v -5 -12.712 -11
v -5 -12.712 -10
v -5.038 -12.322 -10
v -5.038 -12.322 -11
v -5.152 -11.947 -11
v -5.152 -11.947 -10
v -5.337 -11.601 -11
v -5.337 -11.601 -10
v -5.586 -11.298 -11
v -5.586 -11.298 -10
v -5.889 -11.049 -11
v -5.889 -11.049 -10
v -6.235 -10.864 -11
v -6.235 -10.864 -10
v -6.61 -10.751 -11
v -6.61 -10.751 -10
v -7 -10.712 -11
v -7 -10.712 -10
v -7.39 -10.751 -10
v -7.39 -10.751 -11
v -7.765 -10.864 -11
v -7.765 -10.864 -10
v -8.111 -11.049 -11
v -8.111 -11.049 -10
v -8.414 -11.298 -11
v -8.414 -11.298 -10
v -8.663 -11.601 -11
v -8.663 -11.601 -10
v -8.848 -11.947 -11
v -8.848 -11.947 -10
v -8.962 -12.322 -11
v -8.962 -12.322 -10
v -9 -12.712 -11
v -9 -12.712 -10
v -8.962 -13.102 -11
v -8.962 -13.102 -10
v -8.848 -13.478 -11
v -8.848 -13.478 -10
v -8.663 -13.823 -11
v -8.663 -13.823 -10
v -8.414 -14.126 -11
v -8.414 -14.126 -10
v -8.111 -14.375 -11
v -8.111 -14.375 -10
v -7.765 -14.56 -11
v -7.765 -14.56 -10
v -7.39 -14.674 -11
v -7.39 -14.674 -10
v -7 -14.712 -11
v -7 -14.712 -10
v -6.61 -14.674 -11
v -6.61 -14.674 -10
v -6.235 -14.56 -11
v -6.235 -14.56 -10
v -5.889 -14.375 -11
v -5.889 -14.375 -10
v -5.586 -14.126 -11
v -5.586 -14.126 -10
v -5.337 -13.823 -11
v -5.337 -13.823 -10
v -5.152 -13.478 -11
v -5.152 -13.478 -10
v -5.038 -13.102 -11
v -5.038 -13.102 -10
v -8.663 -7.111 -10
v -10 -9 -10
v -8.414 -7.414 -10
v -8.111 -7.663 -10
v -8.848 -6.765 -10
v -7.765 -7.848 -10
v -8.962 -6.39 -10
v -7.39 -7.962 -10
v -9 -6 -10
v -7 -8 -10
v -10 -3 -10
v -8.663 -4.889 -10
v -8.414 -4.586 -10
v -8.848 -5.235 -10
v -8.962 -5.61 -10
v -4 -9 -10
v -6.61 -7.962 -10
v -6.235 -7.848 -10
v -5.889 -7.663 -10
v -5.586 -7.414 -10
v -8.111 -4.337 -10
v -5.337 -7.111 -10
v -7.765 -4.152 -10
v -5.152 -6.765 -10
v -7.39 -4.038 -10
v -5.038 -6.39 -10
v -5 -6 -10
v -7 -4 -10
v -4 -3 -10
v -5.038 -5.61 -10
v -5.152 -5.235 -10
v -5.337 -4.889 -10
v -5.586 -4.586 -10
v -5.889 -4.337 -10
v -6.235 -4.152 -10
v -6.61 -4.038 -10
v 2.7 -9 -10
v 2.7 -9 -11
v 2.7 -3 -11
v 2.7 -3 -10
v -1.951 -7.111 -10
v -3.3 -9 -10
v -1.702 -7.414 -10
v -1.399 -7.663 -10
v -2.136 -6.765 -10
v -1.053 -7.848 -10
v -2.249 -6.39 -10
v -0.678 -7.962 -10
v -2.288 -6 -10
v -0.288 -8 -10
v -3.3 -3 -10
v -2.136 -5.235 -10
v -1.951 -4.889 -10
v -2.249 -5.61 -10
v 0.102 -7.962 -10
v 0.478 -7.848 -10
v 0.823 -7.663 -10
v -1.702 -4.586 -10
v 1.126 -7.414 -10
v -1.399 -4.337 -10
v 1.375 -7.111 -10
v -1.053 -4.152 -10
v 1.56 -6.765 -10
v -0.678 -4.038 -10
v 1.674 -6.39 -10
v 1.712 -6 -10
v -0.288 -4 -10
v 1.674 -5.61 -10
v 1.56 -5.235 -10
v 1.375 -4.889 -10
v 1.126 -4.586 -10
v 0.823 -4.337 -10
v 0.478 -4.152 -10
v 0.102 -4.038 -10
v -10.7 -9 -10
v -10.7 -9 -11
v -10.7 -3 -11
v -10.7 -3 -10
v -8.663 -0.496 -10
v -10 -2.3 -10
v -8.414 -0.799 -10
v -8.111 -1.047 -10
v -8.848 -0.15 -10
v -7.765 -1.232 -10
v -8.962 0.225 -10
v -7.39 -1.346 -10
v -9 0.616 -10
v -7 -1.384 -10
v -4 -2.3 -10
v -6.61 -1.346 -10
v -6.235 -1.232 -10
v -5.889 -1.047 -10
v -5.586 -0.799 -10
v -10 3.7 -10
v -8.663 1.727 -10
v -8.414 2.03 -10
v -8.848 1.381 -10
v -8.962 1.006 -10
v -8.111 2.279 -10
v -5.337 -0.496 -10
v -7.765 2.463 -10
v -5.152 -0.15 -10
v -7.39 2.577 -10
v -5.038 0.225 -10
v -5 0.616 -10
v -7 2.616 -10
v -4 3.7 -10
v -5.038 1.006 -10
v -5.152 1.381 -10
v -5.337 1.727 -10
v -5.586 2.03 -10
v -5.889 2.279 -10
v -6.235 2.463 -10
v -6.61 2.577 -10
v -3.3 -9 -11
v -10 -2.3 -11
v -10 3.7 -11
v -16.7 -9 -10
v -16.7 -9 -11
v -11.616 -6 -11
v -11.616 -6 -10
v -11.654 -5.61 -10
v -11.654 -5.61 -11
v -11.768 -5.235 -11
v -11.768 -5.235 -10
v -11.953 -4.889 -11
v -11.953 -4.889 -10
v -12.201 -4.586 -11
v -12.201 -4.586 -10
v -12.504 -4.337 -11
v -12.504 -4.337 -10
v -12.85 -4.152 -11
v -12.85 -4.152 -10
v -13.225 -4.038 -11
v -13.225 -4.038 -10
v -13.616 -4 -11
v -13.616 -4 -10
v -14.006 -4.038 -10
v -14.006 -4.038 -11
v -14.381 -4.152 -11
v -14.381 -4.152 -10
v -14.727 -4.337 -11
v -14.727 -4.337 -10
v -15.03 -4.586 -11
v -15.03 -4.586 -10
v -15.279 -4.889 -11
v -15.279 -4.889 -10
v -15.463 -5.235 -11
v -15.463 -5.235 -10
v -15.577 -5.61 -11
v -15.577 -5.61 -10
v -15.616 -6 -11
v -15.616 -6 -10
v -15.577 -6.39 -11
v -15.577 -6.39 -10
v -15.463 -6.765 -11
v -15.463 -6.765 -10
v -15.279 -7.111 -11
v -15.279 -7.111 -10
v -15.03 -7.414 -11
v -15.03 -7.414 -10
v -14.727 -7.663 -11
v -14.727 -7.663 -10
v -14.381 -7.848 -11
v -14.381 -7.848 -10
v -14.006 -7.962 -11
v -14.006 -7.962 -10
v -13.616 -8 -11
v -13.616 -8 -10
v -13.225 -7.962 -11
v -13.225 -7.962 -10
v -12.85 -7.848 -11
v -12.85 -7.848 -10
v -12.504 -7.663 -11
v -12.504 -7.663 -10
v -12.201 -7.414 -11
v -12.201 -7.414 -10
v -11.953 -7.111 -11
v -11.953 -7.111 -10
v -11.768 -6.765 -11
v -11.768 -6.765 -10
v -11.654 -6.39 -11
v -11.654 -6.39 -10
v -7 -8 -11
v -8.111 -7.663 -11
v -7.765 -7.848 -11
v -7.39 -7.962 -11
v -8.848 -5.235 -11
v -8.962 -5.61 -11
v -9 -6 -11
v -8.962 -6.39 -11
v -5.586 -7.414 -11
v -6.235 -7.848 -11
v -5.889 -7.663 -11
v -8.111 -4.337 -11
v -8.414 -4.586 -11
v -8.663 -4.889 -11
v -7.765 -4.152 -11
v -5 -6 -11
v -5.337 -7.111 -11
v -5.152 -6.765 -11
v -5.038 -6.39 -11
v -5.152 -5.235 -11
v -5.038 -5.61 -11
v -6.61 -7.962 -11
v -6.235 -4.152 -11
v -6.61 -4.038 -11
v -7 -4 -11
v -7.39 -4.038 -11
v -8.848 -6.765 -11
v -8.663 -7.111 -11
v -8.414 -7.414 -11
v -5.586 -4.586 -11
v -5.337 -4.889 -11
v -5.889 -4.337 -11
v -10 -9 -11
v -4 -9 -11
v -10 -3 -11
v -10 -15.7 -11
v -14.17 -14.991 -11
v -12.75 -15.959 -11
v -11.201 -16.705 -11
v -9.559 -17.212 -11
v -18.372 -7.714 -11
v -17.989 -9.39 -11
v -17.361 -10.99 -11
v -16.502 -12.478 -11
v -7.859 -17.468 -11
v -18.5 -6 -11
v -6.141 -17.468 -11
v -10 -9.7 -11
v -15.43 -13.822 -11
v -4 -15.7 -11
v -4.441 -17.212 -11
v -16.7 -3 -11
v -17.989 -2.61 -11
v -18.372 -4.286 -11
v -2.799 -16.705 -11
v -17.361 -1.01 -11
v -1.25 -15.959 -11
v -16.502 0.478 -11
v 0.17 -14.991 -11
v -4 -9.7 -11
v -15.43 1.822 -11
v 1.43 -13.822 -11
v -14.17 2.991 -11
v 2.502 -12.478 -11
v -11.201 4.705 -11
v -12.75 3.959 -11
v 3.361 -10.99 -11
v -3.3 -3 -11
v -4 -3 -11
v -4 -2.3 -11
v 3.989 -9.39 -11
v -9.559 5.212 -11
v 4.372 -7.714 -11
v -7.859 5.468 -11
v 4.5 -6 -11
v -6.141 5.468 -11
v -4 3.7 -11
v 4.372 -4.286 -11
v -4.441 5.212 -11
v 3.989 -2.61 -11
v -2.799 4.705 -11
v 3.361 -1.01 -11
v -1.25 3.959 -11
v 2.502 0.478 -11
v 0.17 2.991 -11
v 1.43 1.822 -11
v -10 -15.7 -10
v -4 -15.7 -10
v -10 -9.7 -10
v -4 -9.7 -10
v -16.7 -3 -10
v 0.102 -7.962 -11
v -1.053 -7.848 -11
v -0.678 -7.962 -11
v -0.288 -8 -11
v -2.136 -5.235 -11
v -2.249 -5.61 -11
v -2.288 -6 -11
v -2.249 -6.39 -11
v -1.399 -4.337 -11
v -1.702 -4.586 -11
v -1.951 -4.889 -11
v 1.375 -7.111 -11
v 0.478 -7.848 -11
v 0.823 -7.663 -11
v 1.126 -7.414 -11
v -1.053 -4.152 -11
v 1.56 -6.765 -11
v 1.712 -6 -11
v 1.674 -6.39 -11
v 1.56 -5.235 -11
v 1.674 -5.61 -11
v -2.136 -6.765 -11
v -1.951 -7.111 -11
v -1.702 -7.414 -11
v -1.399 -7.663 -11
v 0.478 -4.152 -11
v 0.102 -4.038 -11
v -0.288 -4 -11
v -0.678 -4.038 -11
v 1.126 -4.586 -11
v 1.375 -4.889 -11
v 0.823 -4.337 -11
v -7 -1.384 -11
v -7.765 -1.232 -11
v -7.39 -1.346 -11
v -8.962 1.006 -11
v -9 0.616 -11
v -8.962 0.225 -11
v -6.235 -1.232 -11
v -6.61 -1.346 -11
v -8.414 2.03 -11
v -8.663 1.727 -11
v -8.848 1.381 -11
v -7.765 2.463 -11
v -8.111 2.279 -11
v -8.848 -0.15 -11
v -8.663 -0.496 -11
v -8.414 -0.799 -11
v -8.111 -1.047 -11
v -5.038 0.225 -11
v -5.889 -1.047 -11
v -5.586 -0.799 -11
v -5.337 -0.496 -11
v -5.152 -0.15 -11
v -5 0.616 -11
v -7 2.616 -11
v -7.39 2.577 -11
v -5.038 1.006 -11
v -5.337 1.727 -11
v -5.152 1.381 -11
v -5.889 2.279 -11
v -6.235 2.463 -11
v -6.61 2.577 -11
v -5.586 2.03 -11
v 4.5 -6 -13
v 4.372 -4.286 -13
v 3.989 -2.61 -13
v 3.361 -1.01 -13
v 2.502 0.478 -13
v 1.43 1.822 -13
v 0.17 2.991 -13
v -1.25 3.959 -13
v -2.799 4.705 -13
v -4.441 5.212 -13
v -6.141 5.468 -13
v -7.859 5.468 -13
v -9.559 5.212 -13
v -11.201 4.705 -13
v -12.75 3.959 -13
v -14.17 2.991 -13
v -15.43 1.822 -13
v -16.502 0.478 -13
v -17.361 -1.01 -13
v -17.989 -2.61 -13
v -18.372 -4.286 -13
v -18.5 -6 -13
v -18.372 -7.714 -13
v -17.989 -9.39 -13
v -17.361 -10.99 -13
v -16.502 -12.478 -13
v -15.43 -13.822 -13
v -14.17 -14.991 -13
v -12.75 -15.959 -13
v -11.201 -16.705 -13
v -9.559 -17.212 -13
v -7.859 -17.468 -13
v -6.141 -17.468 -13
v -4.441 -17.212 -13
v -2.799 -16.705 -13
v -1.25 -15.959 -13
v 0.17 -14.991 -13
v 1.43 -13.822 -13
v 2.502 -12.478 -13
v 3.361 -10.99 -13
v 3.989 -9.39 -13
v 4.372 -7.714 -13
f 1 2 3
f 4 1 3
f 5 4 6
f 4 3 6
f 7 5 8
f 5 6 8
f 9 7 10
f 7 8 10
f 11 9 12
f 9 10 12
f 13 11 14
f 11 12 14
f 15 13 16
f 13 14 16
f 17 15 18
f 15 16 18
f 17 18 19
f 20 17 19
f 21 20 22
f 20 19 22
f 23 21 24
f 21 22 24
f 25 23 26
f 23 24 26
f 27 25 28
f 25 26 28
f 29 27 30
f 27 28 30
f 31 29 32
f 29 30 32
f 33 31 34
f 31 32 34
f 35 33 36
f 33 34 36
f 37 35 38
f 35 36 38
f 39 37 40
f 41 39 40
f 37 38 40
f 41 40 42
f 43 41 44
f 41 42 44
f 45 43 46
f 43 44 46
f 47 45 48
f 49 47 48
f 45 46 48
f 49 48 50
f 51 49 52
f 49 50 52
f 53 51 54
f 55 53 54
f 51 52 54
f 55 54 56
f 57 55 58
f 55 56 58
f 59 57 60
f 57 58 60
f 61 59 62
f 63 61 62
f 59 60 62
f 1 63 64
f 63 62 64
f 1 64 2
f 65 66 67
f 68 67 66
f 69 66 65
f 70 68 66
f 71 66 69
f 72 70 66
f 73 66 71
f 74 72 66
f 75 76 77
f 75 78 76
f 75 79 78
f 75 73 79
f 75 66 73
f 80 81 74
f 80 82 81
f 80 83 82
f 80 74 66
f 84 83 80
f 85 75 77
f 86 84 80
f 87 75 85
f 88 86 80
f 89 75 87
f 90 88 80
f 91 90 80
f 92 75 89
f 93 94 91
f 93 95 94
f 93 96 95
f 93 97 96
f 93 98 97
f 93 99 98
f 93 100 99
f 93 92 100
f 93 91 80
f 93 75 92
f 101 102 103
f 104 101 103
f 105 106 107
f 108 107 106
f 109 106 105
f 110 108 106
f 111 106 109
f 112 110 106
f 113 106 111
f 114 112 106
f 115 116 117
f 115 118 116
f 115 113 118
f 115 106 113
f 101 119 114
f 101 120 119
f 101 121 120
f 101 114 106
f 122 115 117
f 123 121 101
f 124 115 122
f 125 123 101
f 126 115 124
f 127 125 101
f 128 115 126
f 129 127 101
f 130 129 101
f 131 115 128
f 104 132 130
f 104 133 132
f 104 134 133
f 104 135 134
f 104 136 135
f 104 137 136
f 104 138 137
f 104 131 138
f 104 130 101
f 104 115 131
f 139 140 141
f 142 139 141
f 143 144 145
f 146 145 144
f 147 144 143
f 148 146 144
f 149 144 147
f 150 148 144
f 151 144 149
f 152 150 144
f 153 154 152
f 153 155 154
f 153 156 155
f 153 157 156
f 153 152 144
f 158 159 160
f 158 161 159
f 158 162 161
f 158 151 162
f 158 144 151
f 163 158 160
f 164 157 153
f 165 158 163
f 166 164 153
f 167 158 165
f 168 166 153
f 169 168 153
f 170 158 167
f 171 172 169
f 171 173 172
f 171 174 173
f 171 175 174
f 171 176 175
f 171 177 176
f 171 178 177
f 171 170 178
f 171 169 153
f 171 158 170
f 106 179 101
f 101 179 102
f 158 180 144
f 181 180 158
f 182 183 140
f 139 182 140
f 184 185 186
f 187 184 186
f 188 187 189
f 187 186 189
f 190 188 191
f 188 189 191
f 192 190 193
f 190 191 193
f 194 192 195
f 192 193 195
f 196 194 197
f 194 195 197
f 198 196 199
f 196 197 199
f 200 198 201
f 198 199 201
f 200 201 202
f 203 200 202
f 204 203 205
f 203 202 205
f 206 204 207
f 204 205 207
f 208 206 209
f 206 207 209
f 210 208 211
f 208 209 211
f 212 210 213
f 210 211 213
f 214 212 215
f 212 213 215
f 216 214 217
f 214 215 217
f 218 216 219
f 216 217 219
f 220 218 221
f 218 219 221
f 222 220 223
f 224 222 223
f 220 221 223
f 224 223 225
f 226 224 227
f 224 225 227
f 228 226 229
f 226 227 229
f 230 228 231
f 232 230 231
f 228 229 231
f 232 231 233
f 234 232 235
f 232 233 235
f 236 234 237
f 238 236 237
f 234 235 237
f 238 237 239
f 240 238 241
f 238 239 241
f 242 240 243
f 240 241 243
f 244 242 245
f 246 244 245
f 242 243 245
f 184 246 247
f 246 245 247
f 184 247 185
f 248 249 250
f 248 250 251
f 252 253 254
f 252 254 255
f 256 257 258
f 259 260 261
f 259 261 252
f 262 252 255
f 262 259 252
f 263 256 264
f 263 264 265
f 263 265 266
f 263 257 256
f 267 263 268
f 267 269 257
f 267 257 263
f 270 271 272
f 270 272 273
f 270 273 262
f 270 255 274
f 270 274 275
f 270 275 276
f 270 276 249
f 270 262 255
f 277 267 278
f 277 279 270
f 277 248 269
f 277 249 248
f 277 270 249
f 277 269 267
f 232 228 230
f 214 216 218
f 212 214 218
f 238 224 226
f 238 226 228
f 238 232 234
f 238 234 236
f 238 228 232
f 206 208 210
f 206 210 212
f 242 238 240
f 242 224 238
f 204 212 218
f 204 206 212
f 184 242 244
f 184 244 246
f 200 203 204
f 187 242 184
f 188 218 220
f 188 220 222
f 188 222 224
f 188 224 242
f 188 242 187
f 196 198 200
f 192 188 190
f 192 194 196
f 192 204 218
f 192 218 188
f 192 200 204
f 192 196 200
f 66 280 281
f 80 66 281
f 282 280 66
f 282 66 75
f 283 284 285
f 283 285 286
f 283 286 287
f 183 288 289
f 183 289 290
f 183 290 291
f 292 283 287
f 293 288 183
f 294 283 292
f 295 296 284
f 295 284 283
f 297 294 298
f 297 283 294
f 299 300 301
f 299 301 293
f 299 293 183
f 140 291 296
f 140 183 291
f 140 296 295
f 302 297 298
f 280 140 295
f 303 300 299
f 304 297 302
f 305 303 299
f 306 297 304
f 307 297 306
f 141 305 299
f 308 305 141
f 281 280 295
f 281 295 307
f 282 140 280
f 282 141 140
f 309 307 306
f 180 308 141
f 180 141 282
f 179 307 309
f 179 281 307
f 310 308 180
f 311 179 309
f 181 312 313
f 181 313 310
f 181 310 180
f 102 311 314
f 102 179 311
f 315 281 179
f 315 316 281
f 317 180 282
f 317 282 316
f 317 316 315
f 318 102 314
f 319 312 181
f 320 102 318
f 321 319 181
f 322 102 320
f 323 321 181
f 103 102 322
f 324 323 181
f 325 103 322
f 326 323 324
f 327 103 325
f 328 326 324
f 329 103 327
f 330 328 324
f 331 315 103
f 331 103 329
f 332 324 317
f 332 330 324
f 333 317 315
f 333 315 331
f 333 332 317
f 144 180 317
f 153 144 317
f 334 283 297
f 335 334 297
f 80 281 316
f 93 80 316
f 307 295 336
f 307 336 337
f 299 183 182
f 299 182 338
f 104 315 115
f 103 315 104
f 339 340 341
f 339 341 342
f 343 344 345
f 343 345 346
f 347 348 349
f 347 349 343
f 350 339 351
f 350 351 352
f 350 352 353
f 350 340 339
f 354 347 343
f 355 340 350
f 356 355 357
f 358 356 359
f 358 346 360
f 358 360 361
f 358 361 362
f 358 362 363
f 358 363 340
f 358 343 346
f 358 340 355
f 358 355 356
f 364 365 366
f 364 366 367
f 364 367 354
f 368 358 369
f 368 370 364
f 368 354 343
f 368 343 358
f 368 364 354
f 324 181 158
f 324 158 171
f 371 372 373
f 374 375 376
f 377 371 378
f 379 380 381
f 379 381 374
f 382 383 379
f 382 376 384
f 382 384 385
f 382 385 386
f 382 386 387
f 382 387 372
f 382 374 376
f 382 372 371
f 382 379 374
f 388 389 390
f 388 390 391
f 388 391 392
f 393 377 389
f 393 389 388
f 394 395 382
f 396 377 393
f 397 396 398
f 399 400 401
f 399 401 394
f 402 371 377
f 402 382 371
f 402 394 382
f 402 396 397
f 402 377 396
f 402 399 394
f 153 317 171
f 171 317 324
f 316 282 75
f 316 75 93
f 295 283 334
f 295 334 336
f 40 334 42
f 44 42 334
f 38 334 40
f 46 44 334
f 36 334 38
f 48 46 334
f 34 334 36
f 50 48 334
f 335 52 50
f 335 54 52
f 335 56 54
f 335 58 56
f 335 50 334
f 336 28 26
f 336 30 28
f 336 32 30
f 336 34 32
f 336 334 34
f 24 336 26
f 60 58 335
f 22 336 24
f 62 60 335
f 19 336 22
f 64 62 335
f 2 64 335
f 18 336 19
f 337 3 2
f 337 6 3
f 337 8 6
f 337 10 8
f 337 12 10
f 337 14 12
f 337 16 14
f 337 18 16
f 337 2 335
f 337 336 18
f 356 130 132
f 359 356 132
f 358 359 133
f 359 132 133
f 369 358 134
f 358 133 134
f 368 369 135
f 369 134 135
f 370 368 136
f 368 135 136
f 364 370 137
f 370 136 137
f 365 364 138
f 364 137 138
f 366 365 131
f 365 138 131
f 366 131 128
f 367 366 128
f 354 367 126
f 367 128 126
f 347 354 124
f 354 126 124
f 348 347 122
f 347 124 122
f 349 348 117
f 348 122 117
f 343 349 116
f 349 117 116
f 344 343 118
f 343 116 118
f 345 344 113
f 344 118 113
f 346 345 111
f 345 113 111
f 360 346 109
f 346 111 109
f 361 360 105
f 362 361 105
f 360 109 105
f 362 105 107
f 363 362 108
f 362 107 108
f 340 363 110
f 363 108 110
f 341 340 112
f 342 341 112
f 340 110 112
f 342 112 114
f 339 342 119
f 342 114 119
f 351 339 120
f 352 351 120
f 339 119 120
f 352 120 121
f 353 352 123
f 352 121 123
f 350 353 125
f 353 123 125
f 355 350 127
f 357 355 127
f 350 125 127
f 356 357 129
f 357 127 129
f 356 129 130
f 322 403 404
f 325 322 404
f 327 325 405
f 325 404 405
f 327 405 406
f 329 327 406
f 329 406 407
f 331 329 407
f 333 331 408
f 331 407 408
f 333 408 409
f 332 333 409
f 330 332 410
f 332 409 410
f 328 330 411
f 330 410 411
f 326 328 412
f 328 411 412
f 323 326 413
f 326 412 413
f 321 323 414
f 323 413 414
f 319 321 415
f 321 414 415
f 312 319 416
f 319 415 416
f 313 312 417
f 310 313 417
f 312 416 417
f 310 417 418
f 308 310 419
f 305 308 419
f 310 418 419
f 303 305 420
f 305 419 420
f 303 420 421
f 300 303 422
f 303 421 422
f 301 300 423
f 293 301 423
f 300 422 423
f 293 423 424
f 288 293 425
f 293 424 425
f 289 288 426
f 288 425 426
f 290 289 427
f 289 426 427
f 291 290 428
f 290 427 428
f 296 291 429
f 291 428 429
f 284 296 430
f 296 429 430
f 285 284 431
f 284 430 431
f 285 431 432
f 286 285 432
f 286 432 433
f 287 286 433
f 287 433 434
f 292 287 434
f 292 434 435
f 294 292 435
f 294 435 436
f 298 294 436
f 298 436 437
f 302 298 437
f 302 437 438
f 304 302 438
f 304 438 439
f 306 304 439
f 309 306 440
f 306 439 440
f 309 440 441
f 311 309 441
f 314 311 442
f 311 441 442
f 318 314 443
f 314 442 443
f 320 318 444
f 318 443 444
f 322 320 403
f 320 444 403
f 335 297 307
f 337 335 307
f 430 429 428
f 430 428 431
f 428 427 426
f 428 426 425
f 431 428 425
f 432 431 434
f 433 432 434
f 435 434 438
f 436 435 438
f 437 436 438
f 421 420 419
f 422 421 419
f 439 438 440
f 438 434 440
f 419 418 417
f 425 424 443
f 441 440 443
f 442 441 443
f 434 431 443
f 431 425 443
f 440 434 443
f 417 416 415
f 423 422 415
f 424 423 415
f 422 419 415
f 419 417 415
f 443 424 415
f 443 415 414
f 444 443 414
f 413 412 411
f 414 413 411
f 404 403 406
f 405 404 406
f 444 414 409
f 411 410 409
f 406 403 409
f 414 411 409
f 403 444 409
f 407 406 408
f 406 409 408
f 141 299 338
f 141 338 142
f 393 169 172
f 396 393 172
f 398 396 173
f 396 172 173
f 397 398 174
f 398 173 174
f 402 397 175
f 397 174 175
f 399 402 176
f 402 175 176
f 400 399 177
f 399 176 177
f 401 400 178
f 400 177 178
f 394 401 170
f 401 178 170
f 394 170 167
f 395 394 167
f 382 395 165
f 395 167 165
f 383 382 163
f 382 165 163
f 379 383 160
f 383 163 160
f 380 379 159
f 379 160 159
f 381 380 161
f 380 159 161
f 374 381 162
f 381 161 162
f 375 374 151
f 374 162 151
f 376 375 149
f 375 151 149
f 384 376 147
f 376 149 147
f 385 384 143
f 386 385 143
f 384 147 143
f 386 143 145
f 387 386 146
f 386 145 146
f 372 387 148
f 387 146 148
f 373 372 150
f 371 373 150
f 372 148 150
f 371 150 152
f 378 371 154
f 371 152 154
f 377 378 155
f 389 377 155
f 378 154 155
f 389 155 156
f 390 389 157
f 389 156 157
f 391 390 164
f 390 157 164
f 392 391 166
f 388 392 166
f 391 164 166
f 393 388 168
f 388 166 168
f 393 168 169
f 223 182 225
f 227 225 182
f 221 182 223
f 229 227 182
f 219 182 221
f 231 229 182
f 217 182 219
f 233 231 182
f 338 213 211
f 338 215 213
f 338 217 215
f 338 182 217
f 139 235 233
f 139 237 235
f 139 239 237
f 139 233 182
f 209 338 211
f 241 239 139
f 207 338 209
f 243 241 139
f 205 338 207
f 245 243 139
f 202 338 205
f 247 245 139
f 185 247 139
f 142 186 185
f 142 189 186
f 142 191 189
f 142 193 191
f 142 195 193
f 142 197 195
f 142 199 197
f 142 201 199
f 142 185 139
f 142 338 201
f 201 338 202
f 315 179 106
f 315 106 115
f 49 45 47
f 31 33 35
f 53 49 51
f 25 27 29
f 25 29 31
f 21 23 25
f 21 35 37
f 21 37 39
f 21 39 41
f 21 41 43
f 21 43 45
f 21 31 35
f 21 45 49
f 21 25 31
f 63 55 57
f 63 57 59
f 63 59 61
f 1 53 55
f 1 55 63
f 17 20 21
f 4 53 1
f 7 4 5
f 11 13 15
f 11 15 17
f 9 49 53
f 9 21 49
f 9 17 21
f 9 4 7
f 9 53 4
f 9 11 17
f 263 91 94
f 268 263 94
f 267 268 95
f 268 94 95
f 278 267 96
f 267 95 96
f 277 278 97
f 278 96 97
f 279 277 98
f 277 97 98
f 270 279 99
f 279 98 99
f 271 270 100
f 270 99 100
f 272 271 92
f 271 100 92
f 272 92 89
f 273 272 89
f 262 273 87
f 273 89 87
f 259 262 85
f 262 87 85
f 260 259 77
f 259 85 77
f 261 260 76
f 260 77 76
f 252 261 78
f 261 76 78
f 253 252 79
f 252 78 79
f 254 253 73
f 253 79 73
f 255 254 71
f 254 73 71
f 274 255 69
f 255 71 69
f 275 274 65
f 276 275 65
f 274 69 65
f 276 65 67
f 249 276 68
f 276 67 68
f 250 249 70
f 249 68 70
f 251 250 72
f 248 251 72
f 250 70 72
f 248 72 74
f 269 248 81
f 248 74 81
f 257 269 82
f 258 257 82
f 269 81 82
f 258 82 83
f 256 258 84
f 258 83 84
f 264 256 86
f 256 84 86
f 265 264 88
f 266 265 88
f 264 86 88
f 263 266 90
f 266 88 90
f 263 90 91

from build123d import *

# Parameters (mm, degrees)
CYLINDER_R      = 11.5
CYLINDER_DEPTH  = 2
SKETCH002_W     = 6
SKETCH002_H     = 6
PAD001_DEPTH    = 1
SKETCH003_R     = 2
POCKET001_DEPTH = 1
SKETCH004_W     = 6
SKETCH004_H     = 6
PAD002_DEPTH    = 1
SKETCH005_R     = 2
POCKET002_DEPTH = 1


with BuildPart() as part:
    # Cylinder → Cylinder (new body)
    with BuildSketch(Plane.XY):
        Circle(CYLINDER_R)
    extrude(amount=CYLINDER_DEPTH)

    # Sketch002 → Pad001 (new body)
    with BuildSketch(Plane.XY.offset(2)):
        Rectangle(SKETCH002_W, SKETCH002_H)
    extrude(amount=PAD001_DEPTH)

    # Sketch003 → Pocket001 (cut)
    with BuildSketch(Plane.XY.offset(3)):
        Circle(SKETCH003_R)
    extrude(amount=-POCKET001_DEPTH, mode=Mode.SUBTRACT)

    # Sketch004 → Pad002 (new body)
    with BuildSketch(Plane.XY.offset(2)):
        with Locations((0, 6.7)):
            Rectangle(SKETCH004_W, SKETCH004_H)
        with Locations((-6.7, 0)):
            Rectangle(SKETCH004_W, SKETCH004_H)
        with Locations((0, -6.7)):
            Rectangle(SKETCH004_W, SKETCH004_H)
        with Locations((6.7, 0)):
            Rectangle(SKETCH004_W, SKETCH004_H)
    extrude(amount=PAD002_DEPTH)

    # Sketch005 → Pocket002 (cut)
    with BuildSketch(Plane.XY.offset(3)):
        with Locations((0, 6.615592)):
            Circle(SKETCH005_R)
        with Locations((-6.615583, 0)):
            Circle(SKETCH005_R)
        with Locations((6.712149, 0)):
            Circle(SKETCH005_R)
        with Locations((0, -6.712142)):
            Circle(SKETCH005_R)
    extrude(amount=-POCKET002_DEPTH, mode=Mode.SUBTRACT)


with BuildPart() as part_1:
    # Clone001 placement: moved
    add(part.part.moved(Location((-7, -6, -13))))


solid = part_1.part
